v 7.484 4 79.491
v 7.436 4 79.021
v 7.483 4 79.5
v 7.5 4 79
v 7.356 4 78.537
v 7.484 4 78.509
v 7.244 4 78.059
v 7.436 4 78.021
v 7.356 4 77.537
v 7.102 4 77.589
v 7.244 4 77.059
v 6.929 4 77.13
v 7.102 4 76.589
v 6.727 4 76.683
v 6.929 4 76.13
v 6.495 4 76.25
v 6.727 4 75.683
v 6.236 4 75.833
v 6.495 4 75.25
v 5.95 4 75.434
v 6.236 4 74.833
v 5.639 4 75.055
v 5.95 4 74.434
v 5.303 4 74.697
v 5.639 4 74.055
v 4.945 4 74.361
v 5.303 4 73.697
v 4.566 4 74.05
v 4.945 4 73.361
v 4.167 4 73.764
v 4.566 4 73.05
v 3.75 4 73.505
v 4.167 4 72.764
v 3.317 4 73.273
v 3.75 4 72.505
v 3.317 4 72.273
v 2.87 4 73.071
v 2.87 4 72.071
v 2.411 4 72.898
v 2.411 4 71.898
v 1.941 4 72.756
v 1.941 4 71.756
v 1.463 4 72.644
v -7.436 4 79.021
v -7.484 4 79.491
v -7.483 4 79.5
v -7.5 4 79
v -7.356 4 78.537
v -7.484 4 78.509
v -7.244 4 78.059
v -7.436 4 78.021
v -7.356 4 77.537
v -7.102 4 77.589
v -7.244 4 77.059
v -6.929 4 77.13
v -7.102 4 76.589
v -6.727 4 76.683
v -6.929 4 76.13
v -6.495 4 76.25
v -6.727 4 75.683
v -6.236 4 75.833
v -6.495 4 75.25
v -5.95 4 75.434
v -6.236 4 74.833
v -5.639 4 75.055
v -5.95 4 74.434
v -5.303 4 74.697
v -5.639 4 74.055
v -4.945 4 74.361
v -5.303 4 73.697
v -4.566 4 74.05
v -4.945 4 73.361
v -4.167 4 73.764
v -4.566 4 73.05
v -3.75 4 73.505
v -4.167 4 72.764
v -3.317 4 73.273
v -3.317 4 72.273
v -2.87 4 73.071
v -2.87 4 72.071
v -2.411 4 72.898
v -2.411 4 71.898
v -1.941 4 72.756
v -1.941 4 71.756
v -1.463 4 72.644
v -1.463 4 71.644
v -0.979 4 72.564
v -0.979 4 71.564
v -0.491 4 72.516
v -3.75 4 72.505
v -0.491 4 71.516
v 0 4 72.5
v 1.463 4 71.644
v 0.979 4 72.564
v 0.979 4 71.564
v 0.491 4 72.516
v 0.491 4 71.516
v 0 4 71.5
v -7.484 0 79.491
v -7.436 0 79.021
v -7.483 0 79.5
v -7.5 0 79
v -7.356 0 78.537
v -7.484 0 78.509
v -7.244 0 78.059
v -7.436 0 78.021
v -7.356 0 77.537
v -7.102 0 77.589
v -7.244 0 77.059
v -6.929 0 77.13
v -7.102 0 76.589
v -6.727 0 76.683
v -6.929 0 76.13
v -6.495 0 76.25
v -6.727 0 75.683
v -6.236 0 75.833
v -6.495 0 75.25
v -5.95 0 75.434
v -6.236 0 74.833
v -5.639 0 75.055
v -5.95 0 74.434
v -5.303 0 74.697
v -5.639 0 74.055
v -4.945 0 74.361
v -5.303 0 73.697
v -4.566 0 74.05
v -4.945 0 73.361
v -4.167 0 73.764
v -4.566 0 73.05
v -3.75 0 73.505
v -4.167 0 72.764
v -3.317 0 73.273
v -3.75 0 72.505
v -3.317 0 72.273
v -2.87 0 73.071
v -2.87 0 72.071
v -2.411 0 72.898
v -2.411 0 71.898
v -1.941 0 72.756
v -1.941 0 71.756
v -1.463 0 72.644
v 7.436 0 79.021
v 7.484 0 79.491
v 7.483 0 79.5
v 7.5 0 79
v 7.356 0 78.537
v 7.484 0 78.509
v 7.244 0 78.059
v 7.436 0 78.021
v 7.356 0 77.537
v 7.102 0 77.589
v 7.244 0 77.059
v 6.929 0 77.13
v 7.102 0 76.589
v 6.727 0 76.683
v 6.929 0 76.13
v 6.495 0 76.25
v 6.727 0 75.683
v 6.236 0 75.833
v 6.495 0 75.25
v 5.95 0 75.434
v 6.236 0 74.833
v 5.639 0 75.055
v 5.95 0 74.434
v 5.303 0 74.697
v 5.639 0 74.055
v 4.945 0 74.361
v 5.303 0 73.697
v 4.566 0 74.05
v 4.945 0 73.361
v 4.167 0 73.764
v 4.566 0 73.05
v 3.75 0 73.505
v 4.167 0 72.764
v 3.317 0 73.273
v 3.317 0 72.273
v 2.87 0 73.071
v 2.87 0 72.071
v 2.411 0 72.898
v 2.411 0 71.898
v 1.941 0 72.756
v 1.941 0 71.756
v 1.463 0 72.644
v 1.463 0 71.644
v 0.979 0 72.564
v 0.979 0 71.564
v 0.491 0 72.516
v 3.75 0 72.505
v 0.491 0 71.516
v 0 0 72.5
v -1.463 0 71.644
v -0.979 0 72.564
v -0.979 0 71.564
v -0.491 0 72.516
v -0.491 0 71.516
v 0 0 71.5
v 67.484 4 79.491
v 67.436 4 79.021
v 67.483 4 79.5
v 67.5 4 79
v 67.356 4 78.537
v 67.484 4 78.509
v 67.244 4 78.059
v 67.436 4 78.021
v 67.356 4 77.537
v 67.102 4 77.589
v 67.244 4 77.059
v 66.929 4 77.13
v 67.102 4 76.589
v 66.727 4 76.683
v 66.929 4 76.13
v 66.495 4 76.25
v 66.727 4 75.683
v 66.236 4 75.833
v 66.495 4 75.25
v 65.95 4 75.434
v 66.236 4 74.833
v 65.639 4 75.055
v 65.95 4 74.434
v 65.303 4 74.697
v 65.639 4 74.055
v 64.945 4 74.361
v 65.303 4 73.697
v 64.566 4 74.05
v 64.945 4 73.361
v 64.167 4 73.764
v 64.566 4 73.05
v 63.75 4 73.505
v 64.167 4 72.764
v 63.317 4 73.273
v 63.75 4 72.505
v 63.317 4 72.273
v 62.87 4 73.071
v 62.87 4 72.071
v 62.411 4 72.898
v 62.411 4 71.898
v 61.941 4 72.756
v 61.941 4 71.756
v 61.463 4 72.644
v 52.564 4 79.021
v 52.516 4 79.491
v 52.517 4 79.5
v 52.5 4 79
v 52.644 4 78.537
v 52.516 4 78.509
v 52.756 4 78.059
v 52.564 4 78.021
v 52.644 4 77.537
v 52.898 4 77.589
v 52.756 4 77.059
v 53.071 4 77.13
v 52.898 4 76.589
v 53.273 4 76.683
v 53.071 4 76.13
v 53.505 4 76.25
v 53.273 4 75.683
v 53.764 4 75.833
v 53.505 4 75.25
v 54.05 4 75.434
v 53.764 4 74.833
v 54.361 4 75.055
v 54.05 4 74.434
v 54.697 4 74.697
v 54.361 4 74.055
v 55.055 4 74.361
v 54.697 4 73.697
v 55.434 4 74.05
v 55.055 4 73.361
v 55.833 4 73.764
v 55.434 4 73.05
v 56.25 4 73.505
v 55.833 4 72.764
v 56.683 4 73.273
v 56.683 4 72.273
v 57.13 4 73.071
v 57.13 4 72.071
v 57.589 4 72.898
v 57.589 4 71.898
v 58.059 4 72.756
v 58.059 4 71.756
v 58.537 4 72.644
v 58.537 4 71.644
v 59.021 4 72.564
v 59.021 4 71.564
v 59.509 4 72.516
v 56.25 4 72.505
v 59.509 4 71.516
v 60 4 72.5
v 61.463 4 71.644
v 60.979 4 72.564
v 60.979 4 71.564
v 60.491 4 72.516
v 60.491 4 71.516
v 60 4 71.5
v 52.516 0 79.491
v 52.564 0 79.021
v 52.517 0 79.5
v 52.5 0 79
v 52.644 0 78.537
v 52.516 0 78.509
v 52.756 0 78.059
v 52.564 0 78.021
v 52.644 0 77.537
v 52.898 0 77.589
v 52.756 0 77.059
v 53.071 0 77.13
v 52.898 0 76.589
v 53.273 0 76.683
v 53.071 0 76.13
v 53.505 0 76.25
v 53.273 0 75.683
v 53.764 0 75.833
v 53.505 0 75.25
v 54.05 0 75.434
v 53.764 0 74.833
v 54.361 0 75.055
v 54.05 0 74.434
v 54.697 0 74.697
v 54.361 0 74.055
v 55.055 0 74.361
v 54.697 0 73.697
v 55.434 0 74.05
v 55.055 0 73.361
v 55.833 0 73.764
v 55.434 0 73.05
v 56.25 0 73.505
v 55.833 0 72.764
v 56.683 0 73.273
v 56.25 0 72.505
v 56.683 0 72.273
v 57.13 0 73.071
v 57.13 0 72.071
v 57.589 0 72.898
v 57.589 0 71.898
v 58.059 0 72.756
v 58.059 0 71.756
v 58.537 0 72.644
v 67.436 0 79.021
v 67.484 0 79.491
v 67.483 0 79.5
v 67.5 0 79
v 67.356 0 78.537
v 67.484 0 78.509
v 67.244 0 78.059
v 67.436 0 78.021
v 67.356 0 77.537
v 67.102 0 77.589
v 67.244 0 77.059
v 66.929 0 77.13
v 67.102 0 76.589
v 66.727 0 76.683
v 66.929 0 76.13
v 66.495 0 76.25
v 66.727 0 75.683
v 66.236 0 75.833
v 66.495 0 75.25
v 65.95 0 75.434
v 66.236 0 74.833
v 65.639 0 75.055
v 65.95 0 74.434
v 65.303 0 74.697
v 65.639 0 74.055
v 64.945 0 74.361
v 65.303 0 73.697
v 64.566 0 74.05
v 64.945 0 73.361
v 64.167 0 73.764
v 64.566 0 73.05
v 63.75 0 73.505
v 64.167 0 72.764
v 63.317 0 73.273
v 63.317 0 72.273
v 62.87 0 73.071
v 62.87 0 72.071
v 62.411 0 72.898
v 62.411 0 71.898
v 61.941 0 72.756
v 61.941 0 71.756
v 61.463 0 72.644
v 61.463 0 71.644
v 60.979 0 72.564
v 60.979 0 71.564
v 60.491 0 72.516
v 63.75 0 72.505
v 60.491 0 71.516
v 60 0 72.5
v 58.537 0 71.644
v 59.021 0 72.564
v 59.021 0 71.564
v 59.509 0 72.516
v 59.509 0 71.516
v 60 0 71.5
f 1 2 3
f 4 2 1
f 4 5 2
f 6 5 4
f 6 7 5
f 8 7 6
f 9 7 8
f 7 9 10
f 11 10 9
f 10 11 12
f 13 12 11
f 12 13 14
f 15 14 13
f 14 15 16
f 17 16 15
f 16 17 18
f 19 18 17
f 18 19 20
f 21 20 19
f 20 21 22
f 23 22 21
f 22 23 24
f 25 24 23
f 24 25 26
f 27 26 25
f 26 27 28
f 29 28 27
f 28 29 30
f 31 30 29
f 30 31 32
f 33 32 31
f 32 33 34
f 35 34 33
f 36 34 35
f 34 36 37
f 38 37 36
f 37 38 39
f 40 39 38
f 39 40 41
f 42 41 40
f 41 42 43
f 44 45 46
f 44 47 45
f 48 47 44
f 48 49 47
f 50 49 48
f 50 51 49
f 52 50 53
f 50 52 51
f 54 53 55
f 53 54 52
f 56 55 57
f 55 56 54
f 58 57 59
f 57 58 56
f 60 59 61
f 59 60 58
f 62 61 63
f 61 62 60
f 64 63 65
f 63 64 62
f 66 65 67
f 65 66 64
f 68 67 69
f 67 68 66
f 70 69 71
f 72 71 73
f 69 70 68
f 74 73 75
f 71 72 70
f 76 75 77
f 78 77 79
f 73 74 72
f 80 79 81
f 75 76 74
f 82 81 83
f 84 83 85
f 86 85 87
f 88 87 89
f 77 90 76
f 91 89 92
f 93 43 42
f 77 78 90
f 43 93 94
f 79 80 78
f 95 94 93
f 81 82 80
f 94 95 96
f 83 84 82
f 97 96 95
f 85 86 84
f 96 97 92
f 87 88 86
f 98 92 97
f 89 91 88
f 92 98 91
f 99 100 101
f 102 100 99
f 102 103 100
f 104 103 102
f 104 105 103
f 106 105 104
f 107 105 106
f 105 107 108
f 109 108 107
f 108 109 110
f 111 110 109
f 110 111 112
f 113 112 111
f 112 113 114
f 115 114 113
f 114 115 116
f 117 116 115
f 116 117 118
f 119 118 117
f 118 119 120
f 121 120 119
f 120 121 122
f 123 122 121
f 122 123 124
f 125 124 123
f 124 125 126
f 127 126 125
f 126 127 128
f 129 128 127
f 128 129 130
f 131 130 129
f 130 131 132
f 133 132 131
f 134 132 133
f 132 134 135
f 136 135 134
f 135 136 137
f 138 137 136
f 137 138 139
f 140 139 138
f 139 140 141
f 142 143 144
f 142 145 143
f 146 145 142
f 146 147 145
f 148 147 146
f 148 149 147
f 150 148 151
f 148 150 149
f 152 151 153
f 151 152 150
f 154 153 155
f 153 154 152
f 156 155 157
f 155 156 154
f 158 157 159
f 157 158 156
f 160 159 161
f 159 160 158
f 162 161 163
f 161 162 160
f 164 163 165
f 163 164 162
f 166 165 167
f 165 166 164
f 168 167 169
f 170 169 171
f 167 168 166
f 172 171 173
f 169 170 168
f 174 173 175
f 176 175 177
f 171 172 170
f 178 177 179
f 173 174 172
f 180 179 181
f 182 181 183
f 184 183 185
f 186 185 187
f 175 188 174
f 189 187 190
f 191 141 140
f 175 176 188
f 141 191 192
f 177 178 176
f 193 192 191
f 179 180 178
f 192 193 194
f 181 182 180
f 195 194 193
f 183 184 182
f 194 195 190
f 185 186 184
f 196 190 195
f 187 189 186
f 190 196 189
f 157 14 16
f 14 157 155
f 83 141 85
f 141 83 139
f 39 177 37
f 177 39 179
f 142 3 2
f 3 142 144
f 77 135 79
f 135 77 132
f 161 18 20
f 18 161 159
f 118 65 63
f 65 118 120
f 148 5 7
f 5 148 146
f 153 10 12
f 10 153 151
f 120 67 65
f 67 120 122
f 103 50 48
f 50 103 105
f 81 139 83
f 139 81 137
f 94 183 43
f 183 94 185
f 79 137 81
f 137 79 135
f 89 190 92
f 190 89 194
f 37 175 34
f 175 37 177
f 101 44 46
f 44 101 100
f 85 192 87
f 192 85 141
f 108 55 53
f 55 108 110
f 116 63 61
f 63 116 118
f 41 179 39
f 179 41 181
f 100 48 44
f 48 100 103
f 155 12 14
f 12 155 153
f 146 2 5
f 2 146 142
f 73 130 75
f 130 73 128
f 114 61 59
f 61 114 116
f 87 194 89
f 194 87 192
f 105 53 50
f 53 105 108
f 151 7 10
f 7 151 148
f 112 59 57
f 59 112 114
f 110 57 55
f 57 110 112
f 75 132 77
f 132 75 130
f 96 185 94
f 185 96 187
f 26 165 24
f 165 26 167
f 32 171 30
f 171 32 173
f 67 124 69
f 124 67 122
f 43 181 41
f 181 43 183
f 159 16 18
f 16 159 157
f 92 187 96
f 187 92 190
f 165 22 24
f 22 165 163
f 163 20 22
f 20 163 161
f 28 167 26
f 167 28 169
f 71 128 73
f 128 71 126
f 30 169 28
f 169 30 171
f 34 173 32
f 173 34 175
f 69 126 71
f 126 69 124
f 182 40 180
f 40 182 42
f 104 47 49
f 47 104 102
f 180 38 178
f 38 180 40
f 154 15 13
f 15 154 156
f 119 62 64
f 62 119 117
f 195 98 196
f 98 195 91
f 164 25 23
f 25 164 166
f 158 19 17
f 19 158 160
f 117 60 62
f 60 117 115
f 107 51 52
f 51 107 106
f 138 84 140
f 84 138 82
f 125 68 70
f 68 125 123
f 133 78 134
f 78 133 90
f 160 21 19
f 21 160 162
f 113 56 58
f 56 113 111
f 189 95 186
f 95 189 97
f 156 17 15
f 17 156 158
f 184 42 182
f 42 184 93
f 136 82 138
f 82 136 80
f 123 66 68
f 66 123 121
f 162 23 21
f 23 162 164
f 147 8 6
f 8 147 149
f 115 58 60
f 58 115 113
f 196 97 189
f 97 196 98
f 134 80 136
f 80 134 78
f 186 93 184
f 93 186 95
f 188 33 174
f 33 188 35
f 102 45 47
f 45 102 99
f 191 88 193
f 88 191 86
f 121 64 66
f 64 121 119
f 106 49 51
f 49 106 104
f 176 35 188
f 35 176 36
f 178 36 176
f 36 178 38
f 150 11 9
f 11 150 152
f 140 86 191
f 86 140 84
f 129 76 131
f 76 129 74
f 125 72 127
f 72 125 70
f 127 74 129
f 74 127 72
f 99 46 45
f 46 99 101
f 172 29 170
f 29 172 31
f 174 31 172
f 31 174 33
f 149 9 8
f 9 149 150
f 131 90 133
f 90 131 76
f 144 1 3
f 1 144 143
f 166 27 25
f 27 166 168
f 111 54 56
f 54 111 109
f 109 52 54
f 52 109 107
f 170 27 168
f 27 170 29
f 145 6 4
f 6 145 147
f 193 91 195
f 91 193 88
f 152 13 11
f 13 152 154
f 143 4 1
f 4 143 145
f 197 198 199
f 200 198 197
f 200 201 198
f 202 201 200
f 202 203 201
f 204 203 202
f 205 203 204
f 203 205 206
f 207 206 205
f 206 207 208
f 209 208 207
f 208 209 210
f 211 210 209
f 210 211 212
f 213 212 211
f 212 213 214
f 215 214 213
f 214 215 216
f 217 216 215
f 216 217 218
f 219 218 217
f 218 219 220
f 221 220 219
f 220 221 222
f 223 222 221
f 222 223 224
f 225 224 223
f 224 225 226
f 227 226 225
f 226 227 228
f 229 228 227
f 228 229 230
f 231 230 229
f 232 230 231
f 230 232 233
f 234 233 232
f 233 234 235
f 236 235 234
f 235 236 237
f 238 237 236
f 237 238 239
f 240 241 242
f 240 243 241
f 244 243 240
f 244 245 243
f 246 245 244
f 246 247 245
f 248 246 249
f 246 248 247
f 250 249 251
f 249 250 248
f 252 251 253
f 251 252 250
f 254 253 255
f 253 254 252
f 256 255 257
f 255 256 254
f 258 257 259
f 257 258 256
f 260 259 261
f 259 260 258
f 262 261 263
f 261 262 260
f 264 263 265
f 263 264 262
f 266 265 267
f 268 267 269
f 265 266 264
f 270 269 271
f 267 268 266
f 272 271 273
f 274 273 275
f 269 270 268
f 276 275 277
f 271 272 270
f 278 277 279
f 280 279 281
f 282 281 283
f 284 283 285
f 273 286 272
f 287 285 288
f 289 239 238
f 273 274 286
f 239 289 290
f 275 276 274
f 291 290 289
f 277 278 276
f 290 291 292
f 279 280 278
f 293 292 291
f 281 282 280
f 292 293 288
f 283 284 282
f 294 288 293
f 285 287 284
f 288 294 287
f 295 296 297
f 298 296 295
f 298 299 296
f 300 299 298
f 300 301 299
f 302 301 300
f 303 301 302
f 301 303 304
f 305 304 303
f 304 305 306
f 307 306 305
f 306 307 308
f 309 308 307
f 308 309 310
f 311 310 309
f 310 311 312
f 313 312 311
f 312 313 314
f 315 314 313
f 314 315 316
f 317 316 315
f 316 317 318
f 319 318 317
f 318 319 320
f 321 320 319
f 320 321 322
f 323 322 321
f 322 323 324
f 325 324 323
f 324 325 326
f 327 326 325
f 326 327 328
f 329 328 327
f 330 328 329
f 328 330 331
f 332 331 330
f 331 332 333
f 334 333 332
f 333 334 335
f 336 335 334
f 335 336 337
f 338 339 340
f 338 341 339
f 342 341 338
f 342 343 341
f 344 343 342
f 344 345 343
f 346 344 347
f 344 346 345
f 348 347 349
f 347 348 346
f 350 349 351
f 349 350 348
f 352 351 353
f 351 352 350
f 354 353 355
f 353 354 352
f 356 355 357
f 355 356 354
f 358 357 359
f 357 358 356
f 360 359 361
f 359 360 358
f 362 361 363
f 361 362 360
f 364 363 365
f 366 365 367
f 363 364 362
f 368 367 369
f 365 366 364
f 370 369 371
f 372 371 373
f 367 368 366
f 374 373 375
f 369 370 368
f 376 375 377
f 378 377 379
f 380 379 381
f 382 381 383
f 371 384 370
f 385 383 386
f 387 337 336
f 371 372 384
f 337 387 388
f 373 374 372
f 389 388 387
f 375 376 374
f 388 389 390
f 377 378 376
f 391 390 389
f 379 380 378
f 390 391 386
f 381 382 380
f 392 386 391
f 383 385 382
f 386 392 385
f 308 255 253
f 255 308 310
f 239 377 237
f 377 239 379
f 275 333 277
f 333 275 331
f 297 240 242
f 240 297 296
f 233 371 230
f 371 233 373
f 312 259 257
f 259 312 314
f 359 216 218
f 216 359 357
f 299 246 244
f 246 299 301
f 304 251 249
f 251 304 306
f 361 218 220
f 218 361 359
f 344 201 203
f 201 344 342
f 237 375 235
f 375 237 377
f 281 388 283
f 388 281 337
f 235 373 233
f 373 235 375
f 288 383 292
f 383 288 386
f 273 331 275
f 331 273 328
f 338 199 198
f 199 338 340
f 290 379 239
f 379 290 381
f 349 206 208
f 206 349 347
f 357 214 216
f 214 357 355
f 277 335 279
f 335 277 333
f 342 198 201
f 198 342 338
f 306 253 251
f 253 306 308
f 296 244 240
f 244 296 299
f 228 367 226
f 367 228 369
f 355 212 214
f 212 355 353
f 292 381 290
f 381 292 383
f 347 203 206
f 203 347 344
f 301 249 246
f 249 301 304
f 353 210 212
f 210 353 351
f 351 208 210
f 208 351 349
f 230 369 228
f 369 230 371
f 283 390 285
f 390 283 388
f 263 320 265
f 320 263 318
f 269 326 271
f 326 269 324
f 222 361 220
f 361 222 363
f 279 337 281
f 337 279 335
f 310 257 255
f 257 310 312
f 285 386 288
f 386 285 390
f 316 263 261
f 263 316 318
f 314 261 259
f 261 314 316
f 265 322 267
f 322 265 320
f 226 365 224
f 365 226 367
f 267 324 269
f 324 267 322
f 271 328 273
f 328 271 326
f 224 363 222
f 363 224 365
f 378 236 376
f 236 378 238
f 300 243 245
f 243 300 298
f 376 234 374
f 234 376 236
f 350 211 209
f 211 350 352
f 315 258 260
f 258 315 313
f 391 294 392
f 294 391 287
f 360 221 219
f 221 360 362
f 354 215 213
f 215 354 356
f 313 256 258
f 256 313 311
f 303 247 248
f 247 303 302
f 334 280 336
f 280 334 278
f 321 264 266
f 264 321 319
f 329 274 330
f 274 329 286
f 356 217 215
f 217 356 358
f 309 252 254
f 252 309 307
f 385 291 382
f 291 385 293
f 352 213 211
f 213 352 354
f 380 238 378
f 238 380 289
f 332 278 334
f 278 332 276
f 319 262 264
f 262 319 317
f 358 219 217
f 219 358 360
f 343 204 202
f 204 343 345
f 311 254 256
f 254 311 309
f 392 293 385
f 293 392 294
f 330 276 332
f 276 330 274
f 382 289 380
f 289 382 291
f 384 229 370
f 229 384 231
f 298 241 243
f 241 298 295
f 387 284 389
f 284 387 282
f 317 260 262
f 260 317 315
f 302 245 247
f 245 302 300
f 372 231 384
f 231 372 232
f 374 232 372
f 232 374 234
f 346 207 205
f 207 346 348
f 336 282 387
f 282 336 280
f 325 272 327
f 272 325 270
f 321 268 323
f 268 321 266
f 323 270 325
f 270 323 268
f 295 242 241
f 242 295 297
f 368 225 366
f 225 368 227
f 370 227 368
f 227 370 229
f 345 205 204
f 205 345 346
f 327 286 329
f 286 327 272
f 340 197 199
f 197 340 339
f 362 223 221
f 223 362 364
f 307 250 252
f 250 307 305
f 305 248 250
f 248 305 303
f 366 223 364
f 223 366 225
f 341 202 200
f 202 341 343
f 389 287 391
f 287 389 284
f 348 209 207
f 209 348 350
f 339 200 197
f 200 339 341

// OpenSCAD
// file: ../port_tower.scad
// ============================================================
//  Female port tower: positioning stage (rotated 180 deg so its
//  payload face looks toward -Y) + bracket plate with the keyed
//  D-hole. The bulkhead goes in from the back (flange behind the
//  plate), nut on the front. Plate front face is at world y=0.
// ============================================================
include <stage.scad>

bracket_w      = 36;
bracket_hole_dz = port_z - stage_payload_z;   // hole above payload centre
bracket_bot    = -zs_h / 2;
bracket_top    = bracket_hole_dz + bh_nut_af / cos(30) / 2 + 3;
rib_t          = 5;     // rib width (X)
rib_d          = 7;     // rib depth (out of the plate front)

// Payload-face coordinates: origin at face centre, +Y away from the stage.
module port_bracket() {
    difference() {
        union() {
            translate([-bracket_w / 2, 0, bracket_bot]) cube([bracket_w, plate_t, bracket_top - bracket_bot]);
            // stiffening ribs, outboard of the nut and clear of the plug clamp
            for (sx = [-1, 1])
                translate([sx > 0 ? bracket_w / 2 - rib_t : -bracket_w / 2, plate_t - 0.01, bracket_bot])
                    hull() {
                        cube([rib_t, rib_d, 1]);
                        translate([0, 0, bracket_hole_dz - 14]) cube([rib_t, 0.01, 1]);
                    }
        }
        // keyed D-hole, flat on top
        translate([0, plate_t, bracket_hole_dz]) rotate([90, 0, 0]) d_hole(t = plate_t);
        // mounting screws into the z-slider's captive nuts
        for (p = payload_pts) translate([p[0], -0.01, p[1]]) rotate([-90, 0, 0]) {
            screw_hole(m3_d, plate_t + rib_d);
        }
    }
}

// Whole tower in world coordinates at fine-travel offset (dx, dz),
// measured in world X / Z.
// Tower B (i=1) is the mirror image so its X adjust screw faces outward.
module port_tower_world(i, dx = 0, dz = 0) {
    ldx = i == 0 ? -dx : dx;   // world dx -> stage-local dx
    translate([tower_x(i), tower_y, 0]) rotate([0, 0, 180]) stage_hand(i == 1) {
        stage_assembly(ldx, dz, base = false); // base is part of the X base
        stage_payload_origin(ldx, dz) show("port_bracket") color("Orange") port_bracket();
    }
}

// Bulkhead connector stand-in (for checks / preview), world coords.
module bulkhead_world(i, dx = 0, dz = 0) {
    translate([port_x[i] + dx, port_face_y, port_z + dz]) rotate([90, 0, 0]) show("bulkhead") color("DimGray") {
        cylinder(d = bh_thread_d, h = bh_thread_len - plate_t);                   // thread + face
        cylinder(d = bh_nut_af / cos(30), h = bh_nut_t, $fn = 6);                  // nut
        translate([0, 0, -plate_t - 2]) cylinder(d = bh_flange_d, h = 2);          // flange
        translate([0, 0, -plate_t - 40]) cylinder(d = 14, h = 38);                 // body
    }
}

echo("CHECK", "port_z", port_z);
// file: ../plug_mount.scad
// ============================================================
//  Male plug mount: flexure (frame + 4 L-beams + floating island with
//  the clamp cradle built in), clamp cap, and two identical stop
//  straps (front + back) whose pins limit X/Z float to +/-flex_float
//  and whose 1 mm standoff limits Y float to +/-flex_stop_gap.
//  Local coords: origin at the stage payload face centre, +Y away from
//  the stage, Z relative to the payload centre.
// ============================================================
include <port_tower.scad>
include <axes.scad>

plug_dz = port_z - (yc_top + stage_payload_z); // plug centre above payload centre
blk_x = plug_bx / 2 + 0.1; // snug in X
blk_y0 = flex_t + clamp_wall; // block back face
blk_y1 = blk_y0 + plug_by; // block front face
blk_z0 = plug_dz + plug_drop; // block bottom
blk_z1 = blk_z0 + plug_block[2];
crad_x = blk_x + 5; // cradle half width
crad_y1 = blk_y1 - 0.4; // cradle stops short: cap clamps the block
cap_back_y = crad_y1;
crad_scr = blk_x + 2.5; // cradle screw X
lip_in = plug_bx / 2 - 0.45; // top lips overlap the block by 0.55 mm
relief_hole_d = 7; // through the lips, centred on the cable

isl_x = 19; // island half width
isl_z0 = blk_z0 - 1;
isl_z1 = isl_z0 + flex_isl_h;
flex_g = 6; // island-to-frame gap
in_x = isl_x + flex_g;
in_z0 = isl_z0 - flex_g;
in_z1 = isl_z1 + flex_g;
fr_bar = 5;
fr_x = in_x + fr_bar;
fr_z0 = -zs_h / 2;
fr_z1 = in_z1 + fr_bar;

pin_d = 4;
pin_z = isl_z1 - 4;
pin_hole = pin_d + 2 * flex_float;
strap_w = 8;
strap_t = 3;
strap_foot_w = 18;
strap_z0 = pin_z - 4;
strap_scr = [-5, 5]; // strap screw X (through the top bar)
strap_scr_z = (in_z1 + fr_z1) / 2;

// one L-beam: island bottom face -> down -> outward -> up -> frame side
leg = 3;
function beam_path(sx, sz) =
  let (
    zc = (isl_z0 + isl_z1) / 2,
    zi = sz < 0 ? isl_z0 : isl_z1,
    zh = zi + sz * leg,
    zv = zc + sz * (flex_g - 2 + 0.5),
    xv = sx * (isl_x + leg)
  ) [[sx * 10, zi], [sx * 10, zh], [xv, zh], [xv, zv], [sx * in_x, zv]];

module poly_beam(pts, w) {
  for (k = [0:len(pts) - 2])
    hull() {
      translate(pts[k]) square(w, center=true);
      translate(pts[k + 1]) square(w, center=true);
    }
}

// XZ outline helpers: 2D (x, z) extruded along +Y from y0, thickness t
module xz_extrude(y0, t, convexity=4) { translate([0, y0 + t, 0]) rotate([90, 0, 0]) linear_extrude(height=t, convexity=convexity) children(); }

module plug_flexure() {
  difference() {
    union() {
      xz_extrude(0, flex_t) {
        difference() {
          translate([-fr_x, fr_z0]) square([2 * fr_x, fr_z1 - fr_z0]);
          translate([-in_x, in_z0]) square([2 * in_x, in_z1 - in_z0]);
        }
        translate([-isl_x, isl_z0]) square([2 * isl_x, isl_z1 - isl_z0]);
        for (sx = [-1, 1], sz = [-1, 1]) poly_beam(beam_path(sx, sz), flex_beam_w);
      }
      // clamp cradle on the island front: back wall + side walls
      translate([-crad_x, flex_t - 0.01, blk_z0]) cube([2 * crad_x, clamp_wall + 0.01, plug_block[2]]);
      for (sx = [-1, 1])
        translate([sx > 0 ? blk_x : -crad_x, blk_y0 - 0.01, blk_z0])
          cube([crad_x - blk_x, crad_y1 - blk_y0 + 0.01, plug_block[2]]);
      // Z retention: lips over the block's top corners, leaving a slot for
      // the cable. Nothing under the block: the plug's bent body hangs below.
      for (sx = [-1, 1])
        translate([sx > 0 ? lip_in : -crad_x, blk_y0 - 0.01, blk_z1])
          cube([crad_x - lip_in, crad_y1 - blk_y0 + 0.01, 1.5]);
    }
    // hole through the top lips for the cable strain relief (the plug goes
    // in from below)
    translate([0, blk_y0 + plug_by / 2, blk_z1 - 0.01]) cylinder(d=relief_hole_d, h=1.5 + 0.02);
    // payload screws into the stage z-slider
    for (p = payload_pts) translate([p[0], -0.5, p[1]]) rotate([-90, 0, 0]) screw_hole(m3_d, flex_t + 1);
    // stop-pin hole (through) and strap screws (through the top bar)
    translate([0, -0.5, pin_z]) rotate([-90, 0, 0]) screw_hole(pin_hole, flex_t + 1);
    for (x = strap_scr) translate([x, -0.5, strap_scr_z]) rotate([-90, 0, 0]) screw_hole(m3_d, flex_t + 1);
    // cap screws, tapped into the cradle side walls
    for (sx = [-1, 1])
      translate([sx * crad_scr, crad_y1 + 0.01, (blk_z0 + blk_z1) / 2])
        rotate([90, 0, 0]) screw_hole(m3_tap, crad_y1 - flex_t + 1);
  }
}

// Clamp cap: 1.5 mm over the block, thicker over the screws.
module plug_clamp_cap() {
  // flat back at the cradle front: squeezes the block (it stands 0.4 proud)
  difference() {
    union() {
      translate([-crad_x, cap_back_y, blk_z0]) cube([2 * crad_x, blk_y1 - cap_back_y + clamp_lip_t, plug_block[2]]);
      for (sx = [-1, 1])
        translate([sx > 0 ? blk_x : -crad_x, cap_back_y, blk_z0])
          cube([crad_x - blk_x, 4, plug_block[2]]);
    }
    for (sx = [-1, 1])
      translate([sx * crad_scr, cap_back_y - 0.01, (blk_z0 + blk_z1) / 2])
        rotate([-90, 0, 0]) screw_hole(m3_d, 5);
  }
}

// Stop strap in its own frame: back face on y=0, pin toward -Y.
module plug_flex_stop() {
  difference() {
    union() {
      translate([-strap_w / 2, 0, strap_z0]) cube([strap_w, strap_t, fr_z1 - strap_z0]);
      translate([-strap_foot_w / 2, -flex_stop_gap, in_z1]) cube([strap_foot_w, strap_t + flex_stop_gap, fr_z1 - in_z1]);
      translate([0, 0.01, pin_z]) rotate([90, 0, 0]) cylinder(d=pin_d, h=flex_stop_gap + 2);
    }
    for (x = strap_scr)
      translate([x, -flex_stop_gap - 0.5, strap_scr_z]) rotate([-90, 0, 0])
          screw_hole(m3_d, strap_t + flex_stop_gap + 1);
  }
}

module plug_flex_stops_placed() {
  translate([0, flex_t + flex_stop_gap, 0]) plug_flex_stop(); // front
  translate([0, -flex_stop_gap, 0]) mirror([0, 1, 0]) plug_flex_stop(); // back
}

// The plug, as separate pieces so a slide-in path can be swept piecewise:
// each piece is hulled with a copy moved by the vector sweep.
module plug_body_pieces(sweep = [0, 0, 0], relief = true) {
  module sw() { hull() { children(); translate(sweep) children(); } }
  sw() translate([-plug_bx / 2, blk_y0, blk_z0]) cube([plug_bx, plug_by, plug_block[2]]);
  if (relief) sw() translate([0, blk_y0 + plug_by / 2, blk_z1]) cylinder(d=plug_cable_d, h=15); // cable strain relief
  sw() hull() {
    translate([-plug_bx / 2, blk_y0, plug_dz - 4]) cube([plug_bx, plug_by, blk_z0 - plug_dz + 4]);
    translate([0, blk_y1 + plug_head_proj - 1, plug_dz]) rotate([-90, 0, 0]) cylinder(d=8, h=1);
  }
}
module plug_body_local() { show("usb_plug") color("White") plug_body_pieces(); }

// Everything that moves with the plug carriage, minus the plug itself.
module plug_mount_world(x_pos, y_pos, dx = 0, dz = 0) {
  o = ms_origin(x_pos, y_pos);
  translate(o) {
    stage_assembly(dx, dz, base = false); // base is part of the Y carriage
    stage_payload_origin(dx, dz) {
      show("plug_flexure") color("Orange") plug_flexure();
      show("plug_clamp_cap") color("Gold") plug_clamp_cap();
      show("plug_flex_stop") color("Khaki") plug_flex_stops_placed();
    }
  }
}
module plug_body_world(x_pos, y_pos, dx = 0, dz = 0) {
  o = ms_origin(x_pos, y_pos);
  translate(o) stage_payload_origin(dx, dz) plug_body_local();
}

// ---- checks ----
echo("CHECK", "clamp_lip_t", clamp_lip_t);
echo("CHECK", "clamp_preload", blk_y1 - cap_back_y);
echo("CHECK", "clamp_x_play", blk_x - plug_bx / 2);
echo("CHECK", "pillar_above_flex", pillar_top - (yc_top + stage_payload_z + fr_z1));
echo("CHECK", "clamp_bottom_above_plug", blk_z0 - plug_dz);
echo("CHECK", "clamp_lip_overlap", blk_x - lip_in);
// lip left over the block in front of / behind the relief hole (Y)
echo("CHECK", "lip_hold_y", (plug_by - relief_hole_d) / 2);
echo(
  "CHECK", "plug_insert_err",
  (ms_origin(0, y_travel)[1] + payload_face_y + blk_y1 + plug_head_proj) - bh_face_y
);
echo("CHECK", "flex_xz_stop", (pin_hole - pin_d) / 2);
// beam-to-island and beam-to-frame clearance must exceed the stop travel
echo("CHECK", "flex_beam_clear", leg - flex_beam_w / 2);
// file: ../assembly_lib.scad
// World-placement groups shared by assembly.scad and the full-machine
// collision test. Pinions are left out of these groups because they
// mesh with the racks by design.
include <plug_mount.scad>

module fixed_world() {
    for (i = [0, 1]) { port_tower_world(i); bulkhead_world(i); }
    show("x_base") color("Tan") x_base();
    x_servo_world();
}

module moving_world(x_pos, y_pos) {
    show("x_carriage") color("LightGreen") x_carriage_world(x_pos);
    y_servo_world(x_pos);
    show("y_carriage") color("Yellow") y_carriage_world(x_pos, y_pos);
    plug_mount_world(x_pos, y_pos);
}
// file: probe_lib.scad
// Fit probes built only from the port position and the measured part
// sizes (not from the bracket / clamp variables), so they test the real
// geometry rather than restating its formulas.
include <../assembly_lib.scad>

// Bulkhead thread cross-section (15 mm, flat 6.5 mm from centre, on top)
// pushed through port i's plate, offset by d = [dx, dz].
module probe_port_thread(i, d) {
    translate([port_x[i] + d[0], port_face_y + plate_t + 1, port_z + d[1]]) rotate([90, 0, 0])
        linear_extrude(plate_t + 2) intersection() {
            circle(d = bh_thread_d, $fn = 96);
            translate([-bh_thread_d, -bh_thread_d]) square([2 * bh_thread_d, bh_thread_d + bh_flat]);
        }
}
module probe_port_hole(d) {
    for (i = [0, 1]) intersection() { port_tower_world(i); probe_port_thread(i, d); }
}

// Plug clamp block where it must sit for the magnetic face to meet port
// i's face: face centre at (port_x, bh_face_y, port_z).
module probe_block(i, d) {
    translate([port_x[i] - plug_bx / 2 + d[0],
               bh_face_y - plug_head_proj - plug_by + d[1],
               port_z + plug_drop + d[2]])
        cube([plug_bx, plug_by, plug_block[2]]);
}
// Seat = flexure cradle only (the cap squeezes the block on purpose).
module probe_plug_seat(d) {
    for (i = [0, 1]) intersection() {
        translate(ms_origin(port_x[i], y_travel)) stage_payload_origin() plug_flexure();
        probe_block(i, d);
    }
}
// main file
// 1 mm low: the thread must hit the hole edge.
include <probe_lib.scad>
probe_port_hole([0, -1]);
